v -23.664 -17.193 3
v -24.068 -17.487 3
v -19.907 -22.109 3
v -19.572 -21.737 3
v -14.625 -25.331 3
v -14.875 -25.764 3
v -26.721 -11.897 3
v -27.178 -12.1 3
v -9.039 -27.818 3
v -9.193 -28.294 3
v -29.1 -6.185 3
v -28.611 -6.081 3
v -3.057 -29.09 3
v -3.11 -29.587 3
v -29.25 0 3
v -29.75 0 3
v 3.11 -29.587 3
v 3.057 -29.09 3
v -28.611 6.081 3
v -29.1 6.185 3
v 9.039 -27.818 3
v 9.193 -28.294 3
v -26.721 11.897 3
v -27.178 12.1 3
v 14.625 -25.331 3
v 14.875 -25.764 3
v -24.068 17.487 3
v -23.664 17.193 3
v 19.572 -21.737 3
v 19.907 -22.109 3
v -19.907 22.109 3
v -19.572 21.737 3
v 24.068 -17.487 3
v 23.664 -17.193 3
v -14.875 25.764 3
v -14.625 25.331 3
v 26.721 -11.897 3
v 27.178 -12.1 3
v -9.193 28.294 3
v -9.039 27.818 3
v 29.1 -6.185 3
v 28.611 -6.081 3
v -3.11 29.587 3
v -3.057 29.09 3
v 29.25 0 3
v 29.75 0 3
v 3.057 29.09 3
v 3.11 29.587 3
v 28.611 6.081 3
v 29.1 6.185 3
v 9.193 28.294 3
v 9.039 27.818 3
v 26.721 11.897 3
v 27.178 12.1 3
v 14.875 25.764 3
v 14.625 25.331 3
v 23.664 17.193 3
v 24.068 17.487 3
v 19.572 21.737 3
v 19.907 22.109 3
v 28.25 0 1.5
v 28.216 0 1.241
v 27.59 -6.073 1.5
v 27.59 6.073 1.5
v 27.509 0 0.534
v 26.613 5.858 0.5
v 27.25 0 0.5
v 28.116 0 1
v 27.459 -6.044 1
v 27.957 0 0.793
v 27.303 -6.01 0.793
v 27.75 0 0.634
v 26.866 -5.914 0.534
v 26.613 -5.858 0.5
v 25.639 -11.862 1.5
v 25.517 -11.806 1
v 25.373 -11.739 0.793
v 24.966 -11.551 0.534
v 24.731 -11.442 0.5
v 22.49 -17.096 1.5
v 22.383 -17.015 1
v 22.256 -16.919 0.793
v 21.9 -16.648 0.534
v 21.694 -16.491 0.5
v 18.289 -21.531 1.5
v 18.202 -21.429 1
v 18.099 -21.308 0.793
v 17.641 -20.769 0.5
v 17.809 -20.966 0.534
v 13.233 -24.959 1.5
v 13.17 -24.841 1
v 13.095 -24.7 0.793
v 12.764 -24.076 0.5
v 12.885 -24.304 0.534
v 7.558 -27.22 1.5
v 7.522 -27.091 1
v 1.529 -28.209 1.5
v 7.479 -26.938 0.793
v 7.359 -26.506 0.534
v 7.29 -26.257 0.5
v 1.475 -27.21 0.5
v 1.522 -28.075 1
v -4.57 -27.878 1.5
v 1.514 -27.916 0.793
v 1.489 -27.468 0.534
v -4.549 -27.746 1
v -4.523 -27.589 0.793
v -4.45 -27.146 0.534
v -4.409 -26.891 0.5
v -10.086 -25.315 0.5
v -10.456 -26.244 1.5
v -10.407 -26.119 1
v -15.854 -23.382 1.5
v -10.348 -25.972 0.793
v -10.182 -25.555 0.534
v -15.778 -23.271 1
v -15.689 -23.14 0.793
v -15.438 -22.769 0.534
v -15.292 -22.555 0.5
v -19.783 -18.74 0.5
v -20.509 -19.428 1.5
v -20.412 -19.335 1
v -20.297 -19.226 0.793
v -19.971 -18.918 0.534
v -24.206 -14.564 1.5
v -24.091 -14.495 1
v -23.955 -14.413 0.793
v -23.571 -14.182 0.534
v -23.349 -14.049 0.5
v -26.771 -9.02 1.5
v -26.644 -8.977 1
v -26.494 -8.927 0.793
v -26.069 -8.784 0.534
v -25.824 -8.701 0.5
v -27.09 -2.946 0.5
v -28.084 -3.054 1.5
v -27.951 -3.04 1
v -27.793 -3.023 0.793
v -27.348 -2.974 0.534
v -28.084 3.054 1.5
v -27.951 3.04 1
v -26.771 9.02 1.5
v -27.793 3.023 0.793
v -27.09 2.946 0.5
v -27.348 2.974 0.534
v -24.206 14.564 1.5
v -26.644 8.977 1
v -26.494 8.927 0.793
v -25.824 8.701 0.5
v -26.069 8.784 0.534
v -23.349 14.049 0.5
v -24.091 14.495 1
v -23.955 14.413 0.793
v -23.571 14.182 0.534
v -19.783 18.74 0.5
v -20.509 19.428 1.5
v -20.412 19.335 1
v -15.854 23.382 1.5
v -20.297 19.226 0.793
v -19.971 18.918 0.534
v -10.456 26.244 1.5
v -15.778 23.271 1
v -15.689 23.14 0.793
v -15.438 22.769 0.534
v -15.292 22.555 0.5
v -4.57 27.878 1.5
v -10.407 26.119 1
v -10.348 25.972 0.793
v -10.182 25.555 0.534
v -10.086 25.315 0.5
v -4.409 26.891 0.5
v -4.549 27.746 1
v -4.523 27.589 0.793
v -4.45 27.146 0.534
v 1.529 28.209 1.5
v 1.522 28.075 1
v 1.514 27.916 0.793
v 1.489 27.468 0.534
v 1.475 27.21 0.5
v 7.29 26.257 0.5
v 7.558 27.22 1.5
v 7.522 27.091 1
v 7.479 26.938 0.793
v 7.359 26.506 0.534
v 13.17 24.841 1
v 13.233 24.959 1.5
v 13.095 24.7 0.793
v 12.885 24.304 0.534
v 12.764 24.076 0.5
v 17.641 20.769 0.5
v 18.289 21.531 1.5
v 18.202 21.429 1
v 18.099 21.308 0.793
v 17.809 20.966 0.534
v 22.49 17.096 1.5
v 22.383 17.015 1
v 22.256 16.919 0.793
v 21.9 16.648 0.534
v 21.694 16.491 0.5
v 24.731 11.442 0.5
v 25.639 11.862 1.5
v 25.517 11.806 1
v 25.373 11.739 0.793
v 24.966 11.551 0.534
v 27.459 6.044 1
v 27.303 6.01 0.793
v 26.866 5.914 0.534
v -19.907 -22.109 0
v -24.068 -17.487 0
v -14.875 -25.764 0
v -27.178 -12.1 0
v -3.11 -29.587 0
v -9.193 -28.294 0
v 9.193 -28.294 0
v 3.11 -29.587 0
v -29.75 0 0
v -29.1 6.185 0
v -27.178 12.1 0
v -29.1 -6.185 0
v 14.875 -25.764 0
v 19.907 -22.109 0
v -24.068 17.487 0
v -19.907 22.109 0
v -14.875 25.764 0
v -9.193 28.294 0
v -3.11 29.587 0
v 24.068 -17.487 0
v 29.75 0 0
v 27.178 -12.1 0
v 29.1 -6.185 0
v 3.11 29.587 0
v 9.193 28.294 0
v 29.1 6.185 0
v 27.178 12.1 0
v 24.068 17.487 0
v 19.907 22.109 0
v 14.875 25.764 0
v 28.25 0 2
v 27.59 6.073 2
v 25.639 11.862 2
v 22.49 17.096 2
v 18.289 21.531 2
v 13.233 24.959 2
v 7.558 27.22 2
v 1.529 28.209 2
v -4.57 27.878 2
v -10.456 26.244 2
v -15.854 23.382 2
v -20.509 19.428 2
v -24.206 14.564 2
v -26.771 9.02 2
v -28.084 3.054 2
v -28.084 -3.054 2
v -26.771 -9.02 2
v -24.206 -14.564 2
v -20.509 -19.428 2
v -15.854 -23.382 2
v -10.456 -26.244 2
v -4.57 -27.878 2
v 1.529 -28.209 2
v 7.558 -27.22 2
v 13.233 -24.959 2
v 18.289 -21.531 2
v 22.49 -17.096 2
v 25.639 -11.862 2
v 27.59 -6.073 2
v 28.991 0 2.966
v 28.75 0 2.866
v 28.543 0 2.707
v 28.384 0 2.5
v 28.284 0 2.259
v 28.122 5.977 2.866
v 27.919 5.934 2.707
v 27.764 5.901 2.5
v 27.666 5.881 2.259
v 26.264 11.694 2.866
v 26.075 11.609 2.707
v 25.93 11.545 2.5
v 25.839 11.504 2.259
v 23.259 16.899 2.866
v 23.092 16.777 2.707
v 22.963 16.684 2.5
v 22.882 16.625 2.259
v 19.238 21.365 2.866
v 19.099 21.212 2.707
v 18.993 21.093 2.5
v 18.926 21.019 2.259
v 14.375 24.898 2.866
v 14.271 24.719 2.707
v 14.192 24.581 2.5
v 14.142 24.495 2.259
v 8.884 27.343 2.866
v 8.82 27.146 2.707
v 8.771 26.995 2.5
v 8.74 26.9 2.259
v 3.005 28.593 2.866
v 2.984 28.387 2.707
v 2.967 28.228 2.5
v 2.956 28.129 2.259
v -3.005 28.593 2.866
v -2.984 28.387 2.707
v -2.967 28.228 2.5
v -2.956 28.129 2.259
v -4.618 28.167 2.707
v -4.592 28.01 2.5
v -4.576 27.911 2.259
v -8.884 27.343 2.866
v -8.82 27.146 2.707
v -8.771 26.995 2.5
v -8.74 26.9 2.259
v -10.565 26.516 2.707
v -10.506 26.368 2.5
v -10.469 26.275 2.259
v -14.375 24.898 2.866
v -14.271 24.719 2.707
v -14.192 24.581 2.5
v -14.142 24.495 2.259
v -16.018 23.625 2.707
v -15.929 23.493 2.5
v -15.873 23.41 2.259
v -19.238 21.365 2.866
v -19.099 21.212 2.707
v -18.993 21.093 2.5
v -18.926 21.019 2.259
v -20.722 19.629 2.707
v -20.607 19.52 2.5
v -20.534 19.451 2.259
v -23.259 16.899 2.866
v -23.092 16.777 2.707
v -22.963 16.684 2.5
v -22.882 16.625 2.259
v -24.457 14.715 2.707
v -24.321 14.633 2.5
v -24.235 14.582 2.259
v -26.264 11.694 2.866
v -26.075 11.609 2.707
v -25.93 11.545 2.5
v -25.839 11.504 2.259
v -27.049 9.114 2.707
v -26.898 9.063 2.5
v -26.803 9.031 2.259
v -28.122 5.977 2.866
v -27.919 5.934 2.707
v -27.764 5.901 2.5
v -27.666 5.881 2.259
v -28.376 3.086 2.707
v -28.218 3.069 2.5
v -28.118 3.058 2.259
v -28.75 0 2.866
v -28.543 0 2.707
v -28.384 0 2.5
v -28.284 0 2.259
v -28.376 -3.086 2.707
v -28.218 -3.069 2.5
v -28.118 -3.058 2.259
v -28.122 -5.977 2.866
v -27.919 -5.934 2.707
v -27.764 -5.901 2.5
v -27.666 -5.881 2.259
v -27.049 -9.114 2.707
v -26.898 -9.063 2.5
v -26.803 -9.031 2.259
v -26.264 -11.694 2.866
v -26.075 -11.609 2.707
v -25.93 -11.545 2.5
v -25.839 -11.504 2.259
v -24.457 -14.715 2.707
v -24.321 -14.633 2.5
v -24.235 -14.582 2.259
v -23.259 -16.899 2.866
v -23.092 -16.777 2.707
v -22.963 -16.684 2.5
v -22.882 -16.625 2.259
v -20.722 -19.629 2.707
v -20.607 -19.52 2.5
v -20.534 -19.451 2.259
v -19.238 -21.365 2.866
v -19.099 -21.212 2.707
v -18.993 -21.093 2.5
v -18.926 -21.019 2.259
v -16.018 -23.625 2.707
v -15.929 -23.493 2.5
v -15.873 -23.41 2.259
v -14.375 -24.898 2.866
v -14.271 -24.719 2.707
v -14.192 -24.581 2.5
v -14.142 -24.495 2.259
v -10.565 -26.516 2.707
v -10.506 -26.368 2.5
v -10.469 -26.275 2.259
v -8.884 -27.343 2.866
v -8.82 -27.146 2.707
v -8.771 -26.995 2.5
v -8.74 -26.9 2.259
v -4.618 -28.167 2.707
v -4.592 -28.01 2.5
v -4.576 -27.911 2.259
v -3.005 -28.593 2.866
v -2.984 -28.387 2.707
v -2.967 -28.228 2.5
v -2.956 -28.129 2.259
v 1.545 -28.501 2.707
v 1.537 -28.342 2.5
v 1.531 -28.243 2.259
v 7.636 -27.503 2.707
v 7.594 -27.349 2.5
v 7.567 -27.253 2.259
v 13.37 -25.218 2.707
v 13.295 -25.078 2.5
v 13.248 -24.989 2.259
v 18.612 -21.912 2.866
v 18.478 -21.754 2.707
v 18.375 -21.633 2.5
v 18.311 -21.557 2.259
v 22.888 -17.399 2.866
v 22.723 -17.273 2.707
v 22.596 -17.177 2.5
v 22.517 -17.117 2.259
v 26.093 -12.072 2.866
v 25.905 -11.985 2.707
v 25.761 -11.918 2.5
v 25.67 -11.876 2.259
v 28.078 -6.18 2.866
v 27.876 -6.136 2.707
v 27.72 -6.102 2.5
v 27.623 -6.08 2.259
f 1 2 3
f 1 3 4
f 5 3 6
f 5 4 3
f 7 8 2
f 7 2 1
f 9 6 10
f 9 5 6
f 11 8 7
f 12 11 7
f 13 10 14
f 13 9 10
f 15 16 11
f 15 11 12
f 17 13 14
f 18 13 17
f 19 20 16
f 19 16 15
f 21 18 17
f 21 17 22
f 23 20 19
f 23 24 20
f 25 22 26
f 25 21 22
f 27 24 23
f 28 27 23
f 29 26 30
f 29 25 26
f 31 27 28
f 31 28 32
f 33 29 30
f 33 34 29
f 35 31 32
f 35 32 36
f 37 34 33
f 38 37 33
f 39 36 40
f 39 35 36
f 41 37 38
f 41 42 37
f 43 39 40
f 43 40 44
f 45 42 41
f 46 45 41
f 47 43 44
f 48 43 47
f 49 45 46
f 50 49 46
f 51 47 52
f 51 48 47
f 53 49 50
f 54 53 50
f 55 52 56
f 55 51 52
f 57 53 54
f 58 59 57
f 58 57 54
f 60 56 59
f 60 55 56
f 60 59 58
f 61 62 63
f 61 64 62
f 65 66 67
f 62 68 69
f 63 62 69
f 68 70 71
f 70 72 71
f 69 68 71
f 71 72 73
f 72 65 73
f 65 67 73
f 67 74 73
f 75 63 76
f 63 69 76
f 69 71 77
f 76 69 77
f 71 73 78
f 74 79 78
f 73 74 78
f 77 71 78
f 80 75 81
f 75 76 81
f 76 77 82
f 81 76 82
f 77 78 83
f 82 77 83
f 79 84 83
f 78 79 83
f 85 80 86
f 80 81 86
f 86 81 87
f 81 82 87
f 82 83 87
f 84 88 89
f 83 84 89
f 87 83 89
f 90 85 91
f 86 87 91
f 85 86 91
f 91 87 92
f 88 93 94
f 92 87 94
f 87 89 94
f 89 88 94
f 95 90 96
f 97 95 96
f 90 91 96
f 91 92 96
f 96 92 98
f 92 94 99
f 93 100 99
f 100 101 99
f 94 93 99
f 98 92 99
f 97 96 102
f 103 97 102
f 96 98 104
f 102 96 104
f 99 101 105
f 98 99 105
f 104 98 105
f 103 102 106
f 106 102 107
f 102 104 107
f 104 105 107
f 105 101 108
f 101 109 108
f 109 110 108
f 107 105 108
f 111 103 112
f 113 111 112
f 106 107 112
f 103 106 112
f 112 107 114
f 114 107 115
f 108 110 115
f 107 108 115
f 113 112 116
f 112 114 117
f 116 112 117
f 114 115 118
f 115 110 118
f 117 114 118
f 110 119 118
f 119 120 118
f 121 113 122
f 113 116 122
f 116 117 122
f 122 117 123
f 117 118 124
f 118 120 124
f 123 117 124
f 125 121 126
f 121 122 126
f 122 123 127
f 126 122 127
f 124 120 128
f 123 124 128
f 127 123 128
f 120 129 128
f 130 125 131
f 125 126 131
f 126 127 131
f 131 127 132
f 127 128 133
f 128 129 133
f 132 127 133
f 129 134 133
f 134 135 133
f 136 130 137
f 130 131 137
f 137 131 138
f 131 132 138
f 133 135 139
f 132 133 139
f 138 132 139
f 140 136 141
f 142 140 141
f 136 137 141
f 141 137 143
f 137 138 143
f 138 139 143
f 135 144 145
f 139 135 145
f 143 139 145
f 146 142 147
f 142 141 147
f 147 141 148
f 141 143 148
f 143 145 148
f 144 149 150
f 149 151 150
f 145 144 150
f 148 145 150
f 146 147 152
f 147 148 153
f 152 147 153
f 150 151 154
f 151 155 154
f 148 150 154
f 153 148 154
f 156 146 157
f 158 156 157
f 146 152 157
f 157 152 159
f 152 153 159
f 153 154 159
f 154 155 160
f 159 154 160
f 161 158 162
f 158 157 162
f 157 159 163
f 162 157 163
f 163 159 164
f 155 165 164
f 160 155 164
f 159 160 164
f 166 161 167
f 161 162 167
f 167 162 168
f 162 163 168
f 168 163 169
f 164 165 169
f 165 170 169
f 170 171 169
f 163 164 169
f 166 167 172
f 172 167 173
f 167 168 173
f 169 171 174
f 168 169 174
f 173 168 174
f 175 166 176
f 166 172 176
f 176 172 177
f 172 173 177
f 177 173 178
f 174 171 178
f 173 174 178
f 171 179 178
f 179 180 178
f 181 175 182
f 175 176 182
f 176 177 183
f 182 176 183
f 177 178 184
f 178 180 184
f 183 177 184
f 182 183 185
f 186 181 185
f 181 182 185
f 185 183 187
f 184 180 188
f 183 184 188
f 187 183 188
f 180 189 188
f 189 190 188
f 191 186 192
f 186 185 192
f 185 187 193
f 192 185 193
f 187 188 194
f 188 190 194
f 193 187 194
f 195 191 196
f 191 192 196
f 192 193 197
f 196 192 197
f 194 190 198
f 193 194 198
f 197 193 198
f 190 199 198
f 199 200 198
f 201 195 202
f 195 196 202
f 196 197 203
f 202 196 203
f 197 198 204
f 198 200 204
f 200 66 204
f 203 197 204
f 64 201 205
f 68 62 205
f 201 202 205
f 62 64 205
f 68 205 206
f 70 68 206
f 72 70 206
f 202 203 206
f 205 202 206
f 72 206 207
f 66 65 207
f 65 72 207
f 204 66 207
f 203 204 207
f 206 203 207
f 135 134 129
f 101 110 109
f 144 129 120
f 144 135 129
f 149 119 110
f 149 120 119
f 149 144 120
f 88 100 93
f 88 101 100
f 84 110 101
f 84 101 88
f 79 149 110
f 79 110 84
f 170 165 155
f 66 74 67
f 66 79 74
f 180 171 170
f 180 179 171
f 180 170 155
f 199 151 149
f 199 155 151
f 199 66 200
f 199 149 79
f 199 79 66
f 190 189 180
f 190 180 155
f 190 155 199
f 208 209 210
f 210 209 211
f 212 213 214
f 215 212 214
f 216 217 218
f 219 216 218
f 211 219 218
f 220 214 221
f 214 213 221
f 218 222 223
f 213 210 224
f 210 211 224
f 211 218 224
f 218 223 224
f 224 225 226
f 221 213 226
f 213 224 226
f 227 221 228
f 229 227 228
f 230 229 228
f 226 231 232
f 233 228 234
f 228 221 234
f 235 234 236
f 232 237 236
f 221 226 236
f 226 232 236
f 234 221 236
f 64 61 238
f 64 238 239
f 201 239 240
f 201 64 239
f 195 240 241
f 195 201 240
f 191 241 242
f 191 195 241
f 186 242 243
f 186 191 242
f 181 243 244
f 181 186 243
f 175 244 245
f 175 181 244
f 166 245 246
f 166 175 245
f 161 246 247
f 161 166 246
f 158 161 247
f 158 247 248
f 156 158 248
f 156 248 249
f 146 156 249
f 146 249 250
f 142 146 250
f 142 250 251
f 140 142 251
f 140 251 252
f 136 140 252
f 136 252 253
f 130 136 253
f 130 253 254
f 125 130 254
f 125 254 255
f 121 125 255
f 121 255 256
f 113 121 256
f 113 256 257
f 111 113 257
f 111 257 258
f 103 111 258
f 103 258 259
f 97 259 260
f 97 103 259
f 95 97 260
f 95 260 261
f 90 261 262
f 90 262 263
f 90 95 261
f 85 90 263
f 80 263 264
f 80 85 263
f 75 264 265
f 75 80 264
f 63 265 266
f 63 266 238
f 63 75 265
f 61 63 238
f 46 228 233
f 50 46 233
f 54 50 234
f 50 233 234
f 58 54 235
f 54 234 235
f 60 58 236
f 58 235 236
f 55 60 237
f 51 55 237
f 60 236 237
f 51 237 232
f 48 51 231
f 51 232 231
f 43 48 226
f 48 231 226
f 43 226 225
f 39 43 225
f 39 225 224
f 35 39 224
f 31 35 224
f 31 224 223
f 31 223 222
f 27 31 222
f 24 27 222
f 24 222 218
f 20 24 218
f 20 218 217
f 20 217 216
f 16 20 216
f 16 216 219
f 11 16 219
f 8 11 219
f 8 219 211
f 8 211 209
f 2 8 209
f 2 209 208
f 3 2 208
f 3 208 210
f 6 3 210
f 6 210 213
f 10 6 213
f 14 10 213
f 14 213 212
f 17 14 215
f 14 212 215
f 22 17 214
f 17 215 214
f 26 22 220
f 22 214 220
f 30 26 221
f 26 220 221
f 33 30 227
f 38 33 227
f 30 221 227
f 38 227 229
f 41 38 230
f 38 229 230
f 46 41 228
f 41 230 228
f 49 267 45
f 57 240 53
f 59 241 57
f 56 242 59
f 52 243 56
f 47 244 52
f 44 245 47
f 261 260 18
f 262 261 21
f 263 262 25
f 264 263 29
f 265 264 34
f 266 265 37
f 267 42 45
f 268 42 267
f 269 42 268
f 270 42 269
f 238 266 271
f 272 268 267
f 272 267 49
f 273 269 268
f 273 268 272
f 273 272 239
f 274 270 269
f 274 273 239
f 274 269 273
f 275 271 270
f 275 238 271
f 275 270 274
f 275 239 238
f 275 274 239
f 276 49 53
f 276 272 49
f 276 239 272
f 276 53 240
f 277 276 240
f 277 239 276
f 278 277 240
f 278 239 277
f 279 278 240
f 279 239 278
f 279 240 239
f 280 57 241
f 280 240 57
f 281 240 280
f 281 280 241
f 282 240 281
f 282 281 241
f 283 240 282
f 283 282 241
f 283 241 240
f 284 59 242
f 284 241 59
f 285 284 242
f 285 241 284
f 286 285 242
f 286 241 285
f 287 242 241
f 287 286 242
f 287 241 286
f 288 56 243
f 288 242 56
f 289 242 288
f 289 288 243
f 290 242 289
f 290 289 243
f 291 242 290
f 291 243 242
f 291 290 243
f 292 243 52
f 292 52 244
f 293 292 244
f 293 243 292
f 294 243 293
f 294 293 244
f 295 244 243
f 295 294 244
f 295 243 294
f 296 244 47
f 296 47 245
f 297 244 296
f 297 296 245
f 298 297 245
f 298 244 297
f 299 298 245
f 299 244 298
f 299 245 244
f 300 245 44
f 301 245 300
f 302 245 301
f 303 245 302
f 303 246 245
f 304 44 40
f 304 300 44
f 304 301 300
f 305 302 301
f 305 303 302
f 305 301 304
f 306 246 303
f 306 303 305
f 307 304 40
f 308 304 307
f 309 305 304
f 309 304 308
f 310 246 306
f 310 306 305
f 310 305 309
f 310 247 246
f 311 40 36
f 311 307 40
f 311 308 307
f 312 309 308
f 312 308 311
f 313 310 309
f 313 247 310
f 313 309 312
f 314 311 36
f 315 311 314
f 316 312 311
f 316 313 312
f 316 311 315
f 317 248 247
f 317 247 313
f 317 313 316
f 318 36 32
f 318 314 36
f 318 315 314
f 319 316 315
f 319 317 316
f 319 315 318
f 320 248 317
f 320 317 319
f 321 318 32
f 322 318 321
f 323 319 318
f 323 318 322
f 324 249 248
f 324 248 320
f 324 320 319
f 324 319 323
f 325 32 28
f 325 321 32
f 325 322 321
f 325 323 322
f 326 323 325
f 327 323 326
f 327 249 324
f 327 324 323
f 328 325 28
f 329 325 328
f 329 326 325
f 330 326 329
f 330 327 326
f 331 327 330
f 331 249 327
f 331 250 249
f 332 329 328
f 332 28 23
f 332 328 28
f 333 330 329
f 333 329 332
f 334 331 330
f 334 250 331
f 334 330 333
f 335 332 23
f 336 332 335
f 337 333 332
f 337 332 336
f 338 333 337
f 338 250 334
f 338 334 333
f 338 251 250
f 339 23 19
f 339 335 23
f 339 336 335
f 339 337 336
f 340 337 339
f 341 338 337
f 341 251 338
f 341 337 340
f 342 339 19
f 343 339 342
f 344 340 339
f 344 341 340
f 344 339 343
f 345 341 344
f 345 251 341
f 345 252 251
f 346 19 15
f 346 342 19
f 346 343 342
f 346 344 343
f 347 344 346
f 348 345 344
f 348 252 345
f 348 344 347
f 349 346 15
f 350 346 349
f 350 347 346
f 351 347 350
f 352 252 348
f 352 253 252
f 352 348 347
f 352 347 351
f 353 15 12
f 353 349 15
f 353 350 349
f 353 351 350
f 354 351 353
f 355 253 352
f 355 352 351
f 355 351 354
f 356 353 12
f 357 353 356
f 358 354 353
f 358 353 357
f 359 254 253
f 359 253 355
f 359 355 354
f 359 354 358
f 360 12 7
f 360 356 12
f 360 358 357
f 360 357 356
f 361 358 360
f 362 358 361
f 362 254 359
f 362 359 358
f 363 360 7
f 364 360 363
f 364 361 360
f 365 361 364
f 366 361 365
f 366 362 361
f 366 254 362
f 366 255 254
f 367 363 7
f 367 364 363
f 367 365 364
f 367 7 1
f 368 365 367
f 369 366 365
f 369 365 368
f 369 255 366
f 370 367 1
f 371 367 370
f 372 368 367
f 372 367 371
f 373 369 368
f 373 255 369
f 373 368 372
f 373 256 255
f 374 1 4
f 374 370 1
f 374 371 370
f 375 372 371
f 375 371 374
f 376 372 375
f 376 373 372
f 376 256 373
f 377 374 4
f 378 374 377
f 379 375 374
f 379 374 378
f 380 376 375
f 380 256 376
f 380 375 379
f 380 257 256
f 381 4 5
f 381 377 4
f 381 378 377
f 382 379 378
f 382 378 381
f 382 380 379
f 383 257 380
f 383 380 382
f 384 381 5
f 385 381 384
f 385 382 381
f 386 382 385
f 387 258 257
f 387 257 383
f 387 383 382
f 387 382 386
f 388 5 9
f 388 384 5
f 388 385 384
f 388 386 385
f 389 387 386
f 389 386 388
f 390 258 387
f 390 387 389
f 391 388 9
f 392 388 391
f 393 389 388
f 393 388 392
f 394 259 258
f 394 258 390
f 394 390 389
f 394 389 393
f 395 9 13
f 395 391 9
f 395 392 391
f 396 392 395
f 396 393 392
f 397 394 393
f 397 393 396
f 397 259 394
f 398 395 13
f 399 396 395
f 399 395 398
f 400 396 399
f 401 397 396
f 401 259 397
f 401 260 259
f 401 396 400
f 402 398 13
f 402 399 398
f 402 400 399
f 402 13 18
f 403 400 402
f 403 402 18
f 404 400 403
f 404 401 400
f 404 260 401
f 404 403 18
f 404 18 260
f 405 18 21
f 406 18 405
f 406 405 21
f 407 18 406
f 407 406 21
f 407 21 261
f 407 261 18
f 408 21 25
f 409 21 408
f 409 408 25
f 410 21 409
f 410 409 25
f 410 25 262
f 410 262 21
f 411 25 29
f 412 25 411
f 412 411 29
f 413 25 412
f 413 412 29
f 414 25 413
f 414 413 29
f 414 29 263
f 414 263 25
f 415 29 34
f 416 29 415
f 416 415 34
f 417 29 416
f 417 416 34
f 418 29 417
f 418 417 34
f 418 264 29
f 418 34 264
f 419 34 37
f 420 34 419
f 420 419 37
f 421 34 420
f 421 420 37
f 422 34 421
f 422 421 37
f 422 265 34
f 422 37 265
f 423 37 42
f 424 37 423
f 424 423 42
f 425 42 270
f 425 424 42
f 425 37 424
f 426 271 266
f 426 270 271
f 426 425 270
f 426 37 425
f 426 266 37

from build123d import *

# Parameters (mm, degrees)
F0_R     = 29.75
F0_R_2   = 28.25
F1_DEPTH = 3
F2_DEPTH = 0.5
F3_R     = 1


with BuildPart() as f1:
    # F0 (on Top) → F1 (new body)
    with BuildSketch(Plane.XY):
        Circle(F0_R)
        Circle(F0_R_2, mode=Mode.SUBTRACT)
    extrude(amount=F1_DEPTH)

    # F0 (on Top) → F2 (join)
    with BuildSketch(Plane.XY):
        Circle(F0_R)
        Circle(F0_R_2, mode=Mode.SUBTRACT)
        Circle(F0_R_2)
    extrude(amount=F2_DEPTH)

    # F3
    f3_edges = [f1.edges().sort_by_distance(p)[0] for p in [
        (-28.25, 0, 3),
        (-28.25, 0, 0.5),
    ]]
    fillet(f3_edges, radius=F3_R)


solid = f1.part
